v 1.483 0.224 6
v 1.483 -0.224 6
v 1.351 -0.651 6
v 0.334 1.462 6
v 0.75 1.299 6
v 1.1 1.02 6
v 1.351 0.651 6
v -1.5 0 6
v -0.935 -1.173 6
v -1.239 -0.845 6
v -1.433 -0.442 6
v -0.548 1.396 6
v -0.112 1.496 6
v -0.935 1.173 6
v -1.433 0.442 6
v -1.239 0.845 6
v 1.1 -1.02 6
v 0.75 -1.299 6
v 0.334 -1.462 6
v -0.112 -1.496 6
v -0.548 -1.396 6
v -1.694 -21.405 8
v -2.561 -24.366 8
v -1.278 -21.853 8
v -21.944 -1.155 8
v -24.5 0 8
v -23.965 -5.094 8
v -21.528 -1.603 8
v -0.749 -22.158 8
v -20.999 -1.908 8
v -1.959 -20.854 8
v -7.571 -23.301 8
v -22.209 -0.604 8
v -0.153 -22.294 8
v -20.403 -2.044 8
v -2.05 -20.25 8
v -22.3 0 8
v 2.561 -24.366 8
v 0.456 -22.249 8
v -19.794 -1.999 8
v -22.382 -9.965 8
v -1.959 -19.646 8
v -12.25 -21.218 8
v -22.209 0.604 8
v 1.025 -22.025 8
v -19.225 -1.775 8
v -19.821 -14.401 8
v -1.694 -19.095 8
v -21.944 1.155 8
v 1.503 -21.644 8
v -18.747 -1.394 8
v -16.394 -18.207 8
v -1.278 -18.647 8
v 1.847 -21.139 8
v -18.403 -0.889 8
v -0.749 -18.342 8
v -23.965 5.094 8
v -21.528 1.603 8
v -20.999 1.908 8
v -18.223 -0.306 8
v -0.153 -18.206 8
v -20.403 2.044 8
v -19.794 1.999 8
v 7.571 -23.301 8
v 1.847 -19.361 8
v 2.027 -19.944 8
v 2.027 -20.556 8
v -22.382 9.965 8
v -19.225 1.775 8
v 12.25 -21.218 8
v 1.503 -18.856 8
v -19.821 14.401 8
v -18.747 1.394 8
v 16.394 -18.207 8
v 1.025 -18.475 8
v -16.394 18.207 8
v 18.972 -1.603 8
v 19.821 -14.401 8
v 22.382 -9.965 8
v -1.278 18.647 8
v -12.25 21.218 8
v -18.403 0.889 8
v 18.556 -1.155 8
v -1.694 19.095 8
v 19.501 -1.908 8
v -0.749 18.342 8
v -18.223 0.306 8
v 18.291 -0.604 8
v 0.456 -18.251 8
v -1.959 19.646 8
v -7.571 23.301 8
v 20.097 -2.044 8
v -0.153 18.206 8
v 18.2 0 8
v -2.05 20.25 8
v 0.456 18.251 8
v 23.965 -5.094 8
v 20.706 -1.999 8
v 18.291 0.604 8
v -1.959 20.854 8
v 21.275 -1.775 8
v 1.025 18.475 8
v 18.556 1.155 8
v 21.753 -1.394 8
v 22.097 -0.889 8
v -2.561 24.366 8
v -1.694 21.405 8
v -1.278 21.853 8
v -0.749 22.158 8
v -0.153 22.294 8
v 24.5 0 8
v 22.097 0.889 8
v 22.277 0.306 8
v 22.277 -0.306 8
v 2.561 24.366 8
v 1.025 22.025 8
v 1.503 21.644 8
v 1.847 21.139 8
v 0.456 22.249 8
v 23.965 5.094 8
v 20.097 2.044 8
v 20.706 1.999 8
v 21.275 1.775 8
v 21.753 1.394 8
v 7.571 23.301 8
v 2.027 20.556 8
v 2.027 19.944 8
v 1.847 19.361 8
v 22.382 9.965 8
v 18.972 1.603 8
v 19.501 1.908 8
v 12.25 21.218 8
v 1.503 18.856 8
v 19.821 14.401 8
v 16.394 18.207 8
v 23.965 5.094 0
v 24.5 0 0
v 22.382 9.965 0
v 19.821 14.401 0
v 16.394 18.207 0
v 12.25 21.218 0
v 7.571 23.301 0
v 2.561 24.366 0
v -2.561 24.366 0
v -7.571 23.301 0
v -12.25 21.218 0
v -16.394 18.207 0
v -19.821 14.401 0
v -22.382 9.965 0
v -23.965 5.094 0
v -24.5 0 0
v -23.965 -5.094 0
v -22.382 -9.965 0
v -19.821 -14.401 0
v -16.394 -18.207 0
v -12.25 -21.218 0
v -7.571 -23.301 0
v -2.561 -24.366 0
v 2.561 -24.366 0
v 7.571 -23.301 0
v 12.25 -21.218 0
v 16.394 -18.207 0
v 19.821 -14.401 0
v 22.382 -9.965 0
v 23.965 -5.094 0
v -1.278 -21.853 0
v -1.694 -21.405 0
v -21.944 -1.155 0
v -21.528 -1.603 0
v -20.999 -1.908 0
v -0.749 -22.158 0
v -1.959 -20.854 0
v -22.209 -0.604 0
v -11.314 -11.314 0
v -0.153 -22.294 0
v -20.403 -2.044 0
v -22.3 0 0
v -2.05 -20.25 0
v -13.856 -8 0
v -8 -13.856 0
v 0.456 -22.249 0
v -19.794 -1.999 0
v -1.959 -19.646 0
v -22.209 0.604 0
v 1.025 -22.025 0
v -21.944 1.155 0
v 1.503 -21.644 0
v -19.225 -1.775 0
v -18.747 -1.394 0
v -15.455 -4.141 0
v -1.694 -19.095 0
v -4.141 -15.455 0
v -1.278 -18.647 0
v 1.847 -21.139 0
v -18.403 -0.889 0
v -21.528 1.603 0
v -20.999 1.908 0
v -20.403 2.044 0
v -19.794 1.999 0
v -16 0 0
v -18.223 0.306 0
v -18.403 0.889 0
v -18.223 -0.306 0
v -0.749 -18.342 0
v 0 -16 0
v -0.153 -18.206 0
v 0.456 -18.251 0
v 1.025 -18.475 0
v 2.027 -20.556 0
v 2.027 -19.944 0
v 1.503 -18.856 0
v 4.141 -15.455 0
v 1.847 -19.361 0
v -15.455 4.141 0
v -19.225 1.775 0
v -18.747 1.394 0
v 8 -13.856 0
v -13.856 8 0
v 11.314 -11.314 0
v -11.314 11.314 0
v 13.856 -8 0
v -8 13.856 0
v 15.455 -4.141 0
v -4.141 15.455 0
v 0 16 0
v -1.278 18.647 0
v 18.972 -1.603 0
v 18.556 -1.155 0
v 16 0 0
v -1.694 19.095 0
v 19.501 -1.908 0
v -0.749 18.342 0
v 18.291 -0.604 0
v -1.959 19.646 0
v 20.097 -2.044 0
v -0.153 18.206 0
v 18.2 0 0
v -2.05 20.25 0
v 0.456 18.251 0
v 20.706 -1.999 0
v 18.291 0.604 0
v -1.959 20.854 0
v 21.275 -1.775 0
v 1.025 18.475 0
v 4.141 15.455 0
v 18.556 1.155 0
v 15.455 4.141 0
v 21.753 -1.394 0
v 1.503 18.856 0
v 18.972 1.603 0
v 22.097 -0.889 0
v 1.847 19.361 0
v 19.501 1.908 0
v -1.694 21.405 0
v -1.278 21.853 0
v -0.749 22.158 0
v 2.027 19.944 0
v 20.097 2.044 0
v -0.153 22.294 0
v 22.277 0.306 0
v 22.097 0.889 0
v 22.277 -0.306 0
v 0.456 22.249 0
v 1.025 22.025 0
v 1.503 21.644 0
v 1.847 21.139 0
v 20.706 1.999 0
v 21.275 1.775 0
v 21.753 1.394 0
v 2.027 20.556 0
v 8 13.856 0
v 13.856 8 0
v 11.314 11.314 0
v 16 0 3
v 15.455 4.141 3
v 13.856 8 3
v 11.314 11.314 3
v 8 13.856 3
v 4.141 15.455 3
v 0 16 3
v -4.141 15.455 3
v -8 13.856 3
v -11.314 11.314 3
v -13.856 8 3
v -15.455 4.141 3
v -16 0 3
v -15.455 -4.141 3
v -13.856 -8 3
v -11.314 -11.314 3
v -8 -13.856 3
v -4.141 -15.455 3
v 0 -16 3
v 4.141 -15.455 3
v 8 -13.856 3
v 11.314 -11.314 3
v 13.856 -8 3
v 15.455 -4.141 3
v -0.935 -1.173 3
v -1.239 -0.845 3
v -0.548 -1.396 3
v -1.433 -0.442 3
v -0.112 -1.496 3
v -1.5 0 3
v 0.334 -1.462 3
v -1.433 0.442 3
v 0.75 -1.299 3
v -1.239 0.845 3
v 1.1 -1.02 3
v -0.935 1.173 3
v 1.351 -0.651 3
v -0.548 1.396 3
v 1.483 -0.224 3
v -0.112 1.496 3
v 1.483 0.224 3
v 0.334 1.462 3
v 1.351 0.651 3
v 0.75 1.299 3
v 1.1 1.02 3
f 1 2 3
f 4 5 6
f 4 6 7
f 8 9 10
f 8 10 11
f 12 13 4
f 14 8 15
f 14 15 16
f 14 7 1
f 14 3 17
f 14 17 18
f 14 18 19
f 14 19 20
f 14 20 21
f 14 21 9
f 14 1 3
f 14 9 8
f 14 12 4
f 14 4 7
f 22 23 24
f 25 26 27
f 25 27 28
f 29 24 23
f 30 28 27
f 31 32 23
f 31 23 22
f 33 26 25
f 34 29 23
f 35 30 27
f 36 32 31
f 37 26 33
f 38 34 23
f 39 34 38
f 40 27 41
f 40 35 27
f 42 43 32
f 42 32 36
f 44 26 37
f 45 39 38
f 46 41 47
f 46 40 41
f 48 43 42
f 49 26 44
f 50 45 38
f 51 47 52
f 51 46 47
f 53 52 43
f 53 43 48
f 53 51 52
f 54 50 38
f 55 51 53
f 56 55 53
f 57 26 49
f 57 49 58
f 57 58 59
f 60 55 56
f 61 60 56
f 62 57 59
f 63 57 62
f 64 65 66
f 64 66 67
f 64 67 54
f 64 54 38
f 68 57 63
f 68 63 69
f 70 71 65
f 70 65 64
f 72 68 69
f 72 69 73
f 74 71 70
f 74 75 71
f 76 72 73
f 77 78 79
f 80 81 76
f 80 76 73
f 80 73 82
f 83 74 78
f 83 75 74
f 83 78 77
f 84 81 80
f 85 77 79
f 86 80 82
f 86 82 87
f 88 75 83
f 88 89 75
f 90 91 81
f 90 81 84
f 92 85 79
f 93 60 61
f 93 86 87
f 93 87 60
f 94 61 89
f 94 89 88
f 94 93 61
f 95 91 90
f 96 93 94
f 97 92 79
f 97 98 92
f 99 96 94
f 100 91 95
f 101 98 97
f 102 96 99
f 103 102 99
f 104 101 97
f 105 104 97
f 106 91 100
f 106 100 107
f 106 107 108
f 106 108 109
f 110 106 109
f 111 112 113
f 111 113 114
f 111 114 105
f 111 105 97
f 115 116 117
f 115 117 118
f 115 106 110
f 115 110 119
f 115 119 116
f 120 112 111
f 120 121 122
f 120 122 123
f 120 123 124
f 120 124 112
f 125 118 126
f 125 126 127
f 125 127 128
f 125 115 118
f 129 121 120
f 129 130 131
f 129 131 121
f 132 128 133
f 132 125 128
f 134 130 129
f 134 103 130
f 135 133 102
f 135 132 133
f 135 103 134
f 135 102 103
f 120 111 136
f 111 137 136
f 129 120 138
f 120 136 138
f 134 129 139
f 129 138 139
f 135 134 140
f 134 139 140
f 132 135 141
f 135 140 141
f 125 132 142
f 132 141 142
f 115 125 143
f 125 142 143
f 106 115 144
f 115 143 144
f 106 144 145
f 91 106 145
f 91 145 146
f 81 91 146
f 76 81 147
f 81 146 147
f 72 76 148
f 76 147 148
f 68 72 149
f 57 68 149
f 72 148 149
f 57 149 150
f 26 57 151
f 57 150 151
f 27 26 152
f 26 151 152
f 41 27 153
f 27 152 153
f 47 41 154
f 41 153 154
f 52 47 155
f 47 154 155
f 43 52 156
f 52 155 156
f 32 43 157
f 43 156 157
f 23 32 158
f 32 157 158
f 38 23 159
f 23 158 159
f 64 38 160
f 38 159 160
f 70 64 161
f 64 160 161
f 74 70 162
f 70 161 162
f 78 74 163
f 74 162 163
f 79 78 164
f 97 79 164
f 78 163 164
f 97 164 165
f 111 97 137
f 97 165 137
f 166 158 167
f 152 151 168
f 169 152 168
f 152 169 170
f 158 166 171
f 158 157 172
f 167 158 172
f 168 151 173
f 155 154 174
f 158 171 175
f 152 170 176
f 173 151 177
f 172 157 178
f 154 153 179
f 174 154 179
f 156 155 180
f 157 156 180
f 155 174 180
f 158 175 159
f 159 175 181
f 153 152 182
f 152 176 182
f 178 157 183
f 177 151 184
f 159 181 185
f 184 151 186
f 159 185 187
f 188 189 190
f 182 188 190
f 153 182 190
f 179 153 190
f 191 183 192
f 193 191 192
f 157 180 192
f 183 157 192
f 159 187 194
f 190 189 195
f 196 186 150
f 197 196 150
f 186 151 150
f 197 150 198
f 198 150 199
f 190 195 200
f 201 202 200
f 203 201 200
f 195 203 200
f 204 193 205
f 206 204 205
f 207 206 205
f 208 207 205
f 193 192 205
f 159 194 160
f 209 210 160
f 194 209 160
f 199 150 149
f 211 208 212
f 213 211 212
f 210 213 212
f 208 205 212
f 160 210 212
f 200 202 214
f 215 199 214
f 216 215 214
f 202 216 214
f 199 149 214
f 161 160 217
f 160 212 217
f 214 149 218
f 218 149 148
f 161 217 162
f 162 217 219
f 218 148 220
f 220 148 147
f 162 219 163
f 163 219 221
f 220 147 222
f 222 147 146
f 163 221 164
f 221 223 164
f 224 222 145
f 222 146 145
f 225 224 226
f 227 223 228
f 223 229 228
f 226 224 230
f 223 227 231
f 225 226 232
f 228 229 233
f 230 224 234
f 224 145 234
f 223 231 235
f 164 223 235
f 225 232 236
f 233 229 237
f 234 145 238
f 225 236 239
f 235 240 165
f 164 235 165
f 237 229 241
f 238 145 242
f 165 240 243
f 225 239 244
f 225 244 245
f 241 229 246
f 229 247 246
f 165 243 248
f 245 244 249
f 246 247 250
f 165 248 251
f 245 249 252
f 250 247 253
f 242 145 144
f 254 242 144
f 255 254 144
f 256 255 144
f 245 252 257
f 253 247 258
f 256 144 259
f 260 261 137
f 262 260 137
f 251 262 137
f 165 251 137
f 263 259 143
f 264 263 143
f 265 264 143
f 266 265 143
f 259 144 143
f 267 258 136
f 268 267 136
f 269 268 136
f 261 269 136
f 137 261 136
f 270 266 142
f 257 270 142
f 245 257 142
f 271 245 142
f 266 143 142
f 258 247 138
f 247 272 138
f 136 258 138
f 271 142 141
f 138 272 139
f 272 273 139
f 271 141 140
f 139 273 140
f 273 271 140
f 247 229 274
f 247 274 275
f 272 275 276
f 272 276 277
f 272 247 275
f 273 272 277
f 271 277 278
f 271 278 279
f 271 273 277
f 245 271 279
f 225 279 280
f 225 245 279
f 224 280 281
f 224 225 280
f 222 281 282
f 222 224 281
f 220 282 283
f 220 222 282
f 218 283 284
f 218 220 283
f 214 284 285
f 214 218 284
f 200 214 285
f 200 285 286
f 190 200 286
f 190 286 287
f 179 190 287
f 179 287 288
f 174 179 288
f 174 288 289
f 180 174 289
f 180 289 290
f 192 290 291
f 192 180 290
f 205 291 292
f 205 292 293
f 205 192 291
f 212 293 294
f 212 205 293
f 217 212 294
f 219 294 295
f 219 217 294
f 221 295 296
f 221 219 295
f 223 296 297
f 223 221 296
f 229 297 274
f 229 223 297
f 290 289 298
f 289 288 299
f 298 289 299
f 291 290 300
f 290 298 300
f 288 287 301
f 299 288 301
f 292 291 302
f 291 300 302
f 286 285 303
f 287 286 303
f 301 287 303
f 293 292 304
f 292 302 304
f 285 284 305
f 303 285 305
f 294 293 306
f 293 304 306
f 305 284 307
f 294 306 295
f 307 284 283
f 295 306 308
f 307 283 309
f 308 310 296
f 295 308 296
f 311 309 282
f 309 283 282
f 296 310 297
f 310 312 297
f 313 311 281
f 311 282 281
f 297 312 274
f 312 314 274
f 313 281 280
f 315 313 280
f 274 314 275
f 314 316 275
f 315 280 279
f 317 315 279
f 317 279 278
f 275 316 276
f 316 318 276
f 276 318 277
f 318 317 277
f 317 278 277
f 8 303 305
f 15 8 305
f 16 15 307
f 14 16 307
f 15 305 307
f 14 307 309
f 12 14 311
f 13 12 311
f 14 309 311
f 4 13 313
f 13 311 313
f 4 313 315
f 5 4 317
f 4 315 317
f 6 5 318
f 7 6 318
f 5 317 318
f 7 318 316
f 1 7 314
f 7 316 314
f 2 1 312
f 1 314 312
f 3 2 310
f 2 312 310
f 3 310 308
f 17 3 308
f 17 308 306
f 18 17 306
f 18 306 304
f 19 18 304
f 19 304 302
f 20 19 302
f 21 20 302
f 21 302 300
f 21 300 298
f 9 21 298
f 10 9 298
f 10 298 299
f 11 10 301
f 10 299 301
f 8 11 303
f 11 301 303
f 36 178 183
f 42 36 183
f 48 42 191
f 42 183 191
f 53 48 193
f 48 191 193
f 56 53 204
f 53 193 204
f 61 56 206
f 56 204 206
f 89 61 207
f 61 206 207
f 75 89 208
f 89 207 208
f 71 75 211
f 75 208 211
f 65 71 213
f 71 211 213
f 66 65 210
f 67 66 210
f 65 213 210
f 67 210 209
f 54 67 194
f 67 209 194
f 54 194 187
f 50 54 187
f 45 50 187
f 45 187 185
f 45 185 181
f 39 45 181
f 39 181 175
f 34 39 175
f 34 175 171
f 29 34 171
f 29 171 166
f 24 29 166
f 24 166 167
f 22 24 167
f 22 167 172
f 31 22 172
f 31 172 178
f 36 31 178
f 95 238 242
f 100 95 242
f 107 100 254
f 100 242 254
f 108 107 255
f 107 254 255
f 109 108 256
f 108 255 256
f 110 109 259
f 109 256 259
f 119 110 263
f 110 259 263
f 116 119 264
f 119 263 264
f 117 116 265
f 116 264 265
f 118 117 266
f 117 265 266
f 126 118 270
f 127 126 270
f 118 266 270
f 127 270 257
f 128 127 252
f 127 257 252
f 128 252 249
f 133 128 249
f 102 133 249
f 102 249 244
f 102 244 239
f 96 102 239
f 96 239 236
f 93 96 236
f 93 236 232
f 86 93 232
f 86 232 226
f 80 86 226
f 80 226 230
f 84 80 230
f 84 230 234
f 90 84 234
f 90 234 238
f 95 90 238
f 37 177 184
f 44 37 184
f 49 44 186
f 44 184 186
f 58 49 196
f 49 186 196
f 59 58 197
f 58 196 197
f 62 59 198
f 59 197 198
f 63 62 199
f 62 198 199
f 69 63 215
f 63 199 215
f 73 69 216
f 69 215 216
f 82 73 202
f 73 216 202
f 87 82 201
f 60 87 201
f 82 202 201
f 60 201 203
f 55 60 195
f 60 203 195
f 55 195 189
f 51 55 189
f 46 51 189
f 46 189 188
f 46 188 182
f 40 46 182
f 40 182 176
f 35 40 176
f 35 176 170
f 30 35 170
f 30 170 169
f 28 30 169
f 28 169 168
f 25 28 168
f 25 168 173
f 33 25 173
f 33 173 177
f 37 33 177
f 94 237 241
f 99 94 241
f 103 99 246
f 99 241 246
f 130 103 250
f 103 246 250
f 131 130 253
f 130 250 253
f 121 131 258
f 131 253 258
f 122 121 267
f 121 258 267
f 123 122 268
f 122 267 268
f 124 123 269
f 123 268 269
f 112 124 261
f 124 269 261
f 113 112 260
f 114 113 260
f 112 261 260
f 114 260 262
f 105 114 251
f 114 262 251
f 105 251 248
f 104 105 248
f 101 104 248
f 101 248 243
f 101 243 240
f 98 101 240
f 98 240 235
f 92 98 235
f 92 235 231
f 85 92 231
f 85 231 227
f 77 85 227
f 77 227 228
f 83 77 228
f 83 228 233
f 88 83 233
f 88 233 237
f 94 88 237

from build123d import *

# Parameters (mm, degrees)
SKETCH1_R           = 24.5
SKETCH1_R_2         = 16
BOSS_EXTRUDE1_DEPTH = 3
SKETCH2_R           = 24.5
BOSS_EXTRUDE2_DEPTH = 5
SKETCH3_R           = 2.05
CUT_EXTRUDE1_DEPTH  = 36.559808773
SKETCH4_R           = 1.5
CUT_EXTRUDE2_DEPTH  = 3


with BuildPart() as part:
    # Sketch1 → Boss-Extrude1 (new body)
    with BuildSketch(Plane.XY):
        Circle(SKETCH1_R)
        Circle(SKETCH1_R_2, mode=Mode.SUBTRACT)
    extrude(amount=BOSS_EXTRUDE1_DEPTH)

    # Sketch2 → Boss-Extrude2 (add)
    with BuildSketch(Plane.XY.offset(3)):
        Circle(SKETCH2_R)
    extrude(amount=BOSS_EXTRUDE2_DEPTH)

    # Sketch3 → Cut-Extrude1 (cut, through all)
    with BuildSketch(Plane(origin=(0, 0, 0), x_dir=(-1, 0, 0), z_dir=(0, 0, -1))):
        with Locations((0, 20.25)):
            Circle(SKETCH3_R)
        with Locations((20.25, 0)):
            Circle(SKETCH3_R)
        with Locations((0, -20.25)):
            Circle(SKETCH3_R)
        with Locations((-20.25, 0)):
            Circle(SKETCH3_R)
    extrude(amount=-CUT_EXTRUDE1_DEPTH, mode=Mode.SUBTRACT)

    # Sketch4 → Cut-Extrude2 (cut)
    with BuildSketch(Plane(origin=(0, 0, 3), x_dir=(-1, 0, 0), z_dir=(0, 0, -1))):
        Circle(SKETCH4_R)
    extrude(amount=-CUT_EXTRUDE2_DEPTH, mode=Mode.SUBTRACT)


solid = part.part
